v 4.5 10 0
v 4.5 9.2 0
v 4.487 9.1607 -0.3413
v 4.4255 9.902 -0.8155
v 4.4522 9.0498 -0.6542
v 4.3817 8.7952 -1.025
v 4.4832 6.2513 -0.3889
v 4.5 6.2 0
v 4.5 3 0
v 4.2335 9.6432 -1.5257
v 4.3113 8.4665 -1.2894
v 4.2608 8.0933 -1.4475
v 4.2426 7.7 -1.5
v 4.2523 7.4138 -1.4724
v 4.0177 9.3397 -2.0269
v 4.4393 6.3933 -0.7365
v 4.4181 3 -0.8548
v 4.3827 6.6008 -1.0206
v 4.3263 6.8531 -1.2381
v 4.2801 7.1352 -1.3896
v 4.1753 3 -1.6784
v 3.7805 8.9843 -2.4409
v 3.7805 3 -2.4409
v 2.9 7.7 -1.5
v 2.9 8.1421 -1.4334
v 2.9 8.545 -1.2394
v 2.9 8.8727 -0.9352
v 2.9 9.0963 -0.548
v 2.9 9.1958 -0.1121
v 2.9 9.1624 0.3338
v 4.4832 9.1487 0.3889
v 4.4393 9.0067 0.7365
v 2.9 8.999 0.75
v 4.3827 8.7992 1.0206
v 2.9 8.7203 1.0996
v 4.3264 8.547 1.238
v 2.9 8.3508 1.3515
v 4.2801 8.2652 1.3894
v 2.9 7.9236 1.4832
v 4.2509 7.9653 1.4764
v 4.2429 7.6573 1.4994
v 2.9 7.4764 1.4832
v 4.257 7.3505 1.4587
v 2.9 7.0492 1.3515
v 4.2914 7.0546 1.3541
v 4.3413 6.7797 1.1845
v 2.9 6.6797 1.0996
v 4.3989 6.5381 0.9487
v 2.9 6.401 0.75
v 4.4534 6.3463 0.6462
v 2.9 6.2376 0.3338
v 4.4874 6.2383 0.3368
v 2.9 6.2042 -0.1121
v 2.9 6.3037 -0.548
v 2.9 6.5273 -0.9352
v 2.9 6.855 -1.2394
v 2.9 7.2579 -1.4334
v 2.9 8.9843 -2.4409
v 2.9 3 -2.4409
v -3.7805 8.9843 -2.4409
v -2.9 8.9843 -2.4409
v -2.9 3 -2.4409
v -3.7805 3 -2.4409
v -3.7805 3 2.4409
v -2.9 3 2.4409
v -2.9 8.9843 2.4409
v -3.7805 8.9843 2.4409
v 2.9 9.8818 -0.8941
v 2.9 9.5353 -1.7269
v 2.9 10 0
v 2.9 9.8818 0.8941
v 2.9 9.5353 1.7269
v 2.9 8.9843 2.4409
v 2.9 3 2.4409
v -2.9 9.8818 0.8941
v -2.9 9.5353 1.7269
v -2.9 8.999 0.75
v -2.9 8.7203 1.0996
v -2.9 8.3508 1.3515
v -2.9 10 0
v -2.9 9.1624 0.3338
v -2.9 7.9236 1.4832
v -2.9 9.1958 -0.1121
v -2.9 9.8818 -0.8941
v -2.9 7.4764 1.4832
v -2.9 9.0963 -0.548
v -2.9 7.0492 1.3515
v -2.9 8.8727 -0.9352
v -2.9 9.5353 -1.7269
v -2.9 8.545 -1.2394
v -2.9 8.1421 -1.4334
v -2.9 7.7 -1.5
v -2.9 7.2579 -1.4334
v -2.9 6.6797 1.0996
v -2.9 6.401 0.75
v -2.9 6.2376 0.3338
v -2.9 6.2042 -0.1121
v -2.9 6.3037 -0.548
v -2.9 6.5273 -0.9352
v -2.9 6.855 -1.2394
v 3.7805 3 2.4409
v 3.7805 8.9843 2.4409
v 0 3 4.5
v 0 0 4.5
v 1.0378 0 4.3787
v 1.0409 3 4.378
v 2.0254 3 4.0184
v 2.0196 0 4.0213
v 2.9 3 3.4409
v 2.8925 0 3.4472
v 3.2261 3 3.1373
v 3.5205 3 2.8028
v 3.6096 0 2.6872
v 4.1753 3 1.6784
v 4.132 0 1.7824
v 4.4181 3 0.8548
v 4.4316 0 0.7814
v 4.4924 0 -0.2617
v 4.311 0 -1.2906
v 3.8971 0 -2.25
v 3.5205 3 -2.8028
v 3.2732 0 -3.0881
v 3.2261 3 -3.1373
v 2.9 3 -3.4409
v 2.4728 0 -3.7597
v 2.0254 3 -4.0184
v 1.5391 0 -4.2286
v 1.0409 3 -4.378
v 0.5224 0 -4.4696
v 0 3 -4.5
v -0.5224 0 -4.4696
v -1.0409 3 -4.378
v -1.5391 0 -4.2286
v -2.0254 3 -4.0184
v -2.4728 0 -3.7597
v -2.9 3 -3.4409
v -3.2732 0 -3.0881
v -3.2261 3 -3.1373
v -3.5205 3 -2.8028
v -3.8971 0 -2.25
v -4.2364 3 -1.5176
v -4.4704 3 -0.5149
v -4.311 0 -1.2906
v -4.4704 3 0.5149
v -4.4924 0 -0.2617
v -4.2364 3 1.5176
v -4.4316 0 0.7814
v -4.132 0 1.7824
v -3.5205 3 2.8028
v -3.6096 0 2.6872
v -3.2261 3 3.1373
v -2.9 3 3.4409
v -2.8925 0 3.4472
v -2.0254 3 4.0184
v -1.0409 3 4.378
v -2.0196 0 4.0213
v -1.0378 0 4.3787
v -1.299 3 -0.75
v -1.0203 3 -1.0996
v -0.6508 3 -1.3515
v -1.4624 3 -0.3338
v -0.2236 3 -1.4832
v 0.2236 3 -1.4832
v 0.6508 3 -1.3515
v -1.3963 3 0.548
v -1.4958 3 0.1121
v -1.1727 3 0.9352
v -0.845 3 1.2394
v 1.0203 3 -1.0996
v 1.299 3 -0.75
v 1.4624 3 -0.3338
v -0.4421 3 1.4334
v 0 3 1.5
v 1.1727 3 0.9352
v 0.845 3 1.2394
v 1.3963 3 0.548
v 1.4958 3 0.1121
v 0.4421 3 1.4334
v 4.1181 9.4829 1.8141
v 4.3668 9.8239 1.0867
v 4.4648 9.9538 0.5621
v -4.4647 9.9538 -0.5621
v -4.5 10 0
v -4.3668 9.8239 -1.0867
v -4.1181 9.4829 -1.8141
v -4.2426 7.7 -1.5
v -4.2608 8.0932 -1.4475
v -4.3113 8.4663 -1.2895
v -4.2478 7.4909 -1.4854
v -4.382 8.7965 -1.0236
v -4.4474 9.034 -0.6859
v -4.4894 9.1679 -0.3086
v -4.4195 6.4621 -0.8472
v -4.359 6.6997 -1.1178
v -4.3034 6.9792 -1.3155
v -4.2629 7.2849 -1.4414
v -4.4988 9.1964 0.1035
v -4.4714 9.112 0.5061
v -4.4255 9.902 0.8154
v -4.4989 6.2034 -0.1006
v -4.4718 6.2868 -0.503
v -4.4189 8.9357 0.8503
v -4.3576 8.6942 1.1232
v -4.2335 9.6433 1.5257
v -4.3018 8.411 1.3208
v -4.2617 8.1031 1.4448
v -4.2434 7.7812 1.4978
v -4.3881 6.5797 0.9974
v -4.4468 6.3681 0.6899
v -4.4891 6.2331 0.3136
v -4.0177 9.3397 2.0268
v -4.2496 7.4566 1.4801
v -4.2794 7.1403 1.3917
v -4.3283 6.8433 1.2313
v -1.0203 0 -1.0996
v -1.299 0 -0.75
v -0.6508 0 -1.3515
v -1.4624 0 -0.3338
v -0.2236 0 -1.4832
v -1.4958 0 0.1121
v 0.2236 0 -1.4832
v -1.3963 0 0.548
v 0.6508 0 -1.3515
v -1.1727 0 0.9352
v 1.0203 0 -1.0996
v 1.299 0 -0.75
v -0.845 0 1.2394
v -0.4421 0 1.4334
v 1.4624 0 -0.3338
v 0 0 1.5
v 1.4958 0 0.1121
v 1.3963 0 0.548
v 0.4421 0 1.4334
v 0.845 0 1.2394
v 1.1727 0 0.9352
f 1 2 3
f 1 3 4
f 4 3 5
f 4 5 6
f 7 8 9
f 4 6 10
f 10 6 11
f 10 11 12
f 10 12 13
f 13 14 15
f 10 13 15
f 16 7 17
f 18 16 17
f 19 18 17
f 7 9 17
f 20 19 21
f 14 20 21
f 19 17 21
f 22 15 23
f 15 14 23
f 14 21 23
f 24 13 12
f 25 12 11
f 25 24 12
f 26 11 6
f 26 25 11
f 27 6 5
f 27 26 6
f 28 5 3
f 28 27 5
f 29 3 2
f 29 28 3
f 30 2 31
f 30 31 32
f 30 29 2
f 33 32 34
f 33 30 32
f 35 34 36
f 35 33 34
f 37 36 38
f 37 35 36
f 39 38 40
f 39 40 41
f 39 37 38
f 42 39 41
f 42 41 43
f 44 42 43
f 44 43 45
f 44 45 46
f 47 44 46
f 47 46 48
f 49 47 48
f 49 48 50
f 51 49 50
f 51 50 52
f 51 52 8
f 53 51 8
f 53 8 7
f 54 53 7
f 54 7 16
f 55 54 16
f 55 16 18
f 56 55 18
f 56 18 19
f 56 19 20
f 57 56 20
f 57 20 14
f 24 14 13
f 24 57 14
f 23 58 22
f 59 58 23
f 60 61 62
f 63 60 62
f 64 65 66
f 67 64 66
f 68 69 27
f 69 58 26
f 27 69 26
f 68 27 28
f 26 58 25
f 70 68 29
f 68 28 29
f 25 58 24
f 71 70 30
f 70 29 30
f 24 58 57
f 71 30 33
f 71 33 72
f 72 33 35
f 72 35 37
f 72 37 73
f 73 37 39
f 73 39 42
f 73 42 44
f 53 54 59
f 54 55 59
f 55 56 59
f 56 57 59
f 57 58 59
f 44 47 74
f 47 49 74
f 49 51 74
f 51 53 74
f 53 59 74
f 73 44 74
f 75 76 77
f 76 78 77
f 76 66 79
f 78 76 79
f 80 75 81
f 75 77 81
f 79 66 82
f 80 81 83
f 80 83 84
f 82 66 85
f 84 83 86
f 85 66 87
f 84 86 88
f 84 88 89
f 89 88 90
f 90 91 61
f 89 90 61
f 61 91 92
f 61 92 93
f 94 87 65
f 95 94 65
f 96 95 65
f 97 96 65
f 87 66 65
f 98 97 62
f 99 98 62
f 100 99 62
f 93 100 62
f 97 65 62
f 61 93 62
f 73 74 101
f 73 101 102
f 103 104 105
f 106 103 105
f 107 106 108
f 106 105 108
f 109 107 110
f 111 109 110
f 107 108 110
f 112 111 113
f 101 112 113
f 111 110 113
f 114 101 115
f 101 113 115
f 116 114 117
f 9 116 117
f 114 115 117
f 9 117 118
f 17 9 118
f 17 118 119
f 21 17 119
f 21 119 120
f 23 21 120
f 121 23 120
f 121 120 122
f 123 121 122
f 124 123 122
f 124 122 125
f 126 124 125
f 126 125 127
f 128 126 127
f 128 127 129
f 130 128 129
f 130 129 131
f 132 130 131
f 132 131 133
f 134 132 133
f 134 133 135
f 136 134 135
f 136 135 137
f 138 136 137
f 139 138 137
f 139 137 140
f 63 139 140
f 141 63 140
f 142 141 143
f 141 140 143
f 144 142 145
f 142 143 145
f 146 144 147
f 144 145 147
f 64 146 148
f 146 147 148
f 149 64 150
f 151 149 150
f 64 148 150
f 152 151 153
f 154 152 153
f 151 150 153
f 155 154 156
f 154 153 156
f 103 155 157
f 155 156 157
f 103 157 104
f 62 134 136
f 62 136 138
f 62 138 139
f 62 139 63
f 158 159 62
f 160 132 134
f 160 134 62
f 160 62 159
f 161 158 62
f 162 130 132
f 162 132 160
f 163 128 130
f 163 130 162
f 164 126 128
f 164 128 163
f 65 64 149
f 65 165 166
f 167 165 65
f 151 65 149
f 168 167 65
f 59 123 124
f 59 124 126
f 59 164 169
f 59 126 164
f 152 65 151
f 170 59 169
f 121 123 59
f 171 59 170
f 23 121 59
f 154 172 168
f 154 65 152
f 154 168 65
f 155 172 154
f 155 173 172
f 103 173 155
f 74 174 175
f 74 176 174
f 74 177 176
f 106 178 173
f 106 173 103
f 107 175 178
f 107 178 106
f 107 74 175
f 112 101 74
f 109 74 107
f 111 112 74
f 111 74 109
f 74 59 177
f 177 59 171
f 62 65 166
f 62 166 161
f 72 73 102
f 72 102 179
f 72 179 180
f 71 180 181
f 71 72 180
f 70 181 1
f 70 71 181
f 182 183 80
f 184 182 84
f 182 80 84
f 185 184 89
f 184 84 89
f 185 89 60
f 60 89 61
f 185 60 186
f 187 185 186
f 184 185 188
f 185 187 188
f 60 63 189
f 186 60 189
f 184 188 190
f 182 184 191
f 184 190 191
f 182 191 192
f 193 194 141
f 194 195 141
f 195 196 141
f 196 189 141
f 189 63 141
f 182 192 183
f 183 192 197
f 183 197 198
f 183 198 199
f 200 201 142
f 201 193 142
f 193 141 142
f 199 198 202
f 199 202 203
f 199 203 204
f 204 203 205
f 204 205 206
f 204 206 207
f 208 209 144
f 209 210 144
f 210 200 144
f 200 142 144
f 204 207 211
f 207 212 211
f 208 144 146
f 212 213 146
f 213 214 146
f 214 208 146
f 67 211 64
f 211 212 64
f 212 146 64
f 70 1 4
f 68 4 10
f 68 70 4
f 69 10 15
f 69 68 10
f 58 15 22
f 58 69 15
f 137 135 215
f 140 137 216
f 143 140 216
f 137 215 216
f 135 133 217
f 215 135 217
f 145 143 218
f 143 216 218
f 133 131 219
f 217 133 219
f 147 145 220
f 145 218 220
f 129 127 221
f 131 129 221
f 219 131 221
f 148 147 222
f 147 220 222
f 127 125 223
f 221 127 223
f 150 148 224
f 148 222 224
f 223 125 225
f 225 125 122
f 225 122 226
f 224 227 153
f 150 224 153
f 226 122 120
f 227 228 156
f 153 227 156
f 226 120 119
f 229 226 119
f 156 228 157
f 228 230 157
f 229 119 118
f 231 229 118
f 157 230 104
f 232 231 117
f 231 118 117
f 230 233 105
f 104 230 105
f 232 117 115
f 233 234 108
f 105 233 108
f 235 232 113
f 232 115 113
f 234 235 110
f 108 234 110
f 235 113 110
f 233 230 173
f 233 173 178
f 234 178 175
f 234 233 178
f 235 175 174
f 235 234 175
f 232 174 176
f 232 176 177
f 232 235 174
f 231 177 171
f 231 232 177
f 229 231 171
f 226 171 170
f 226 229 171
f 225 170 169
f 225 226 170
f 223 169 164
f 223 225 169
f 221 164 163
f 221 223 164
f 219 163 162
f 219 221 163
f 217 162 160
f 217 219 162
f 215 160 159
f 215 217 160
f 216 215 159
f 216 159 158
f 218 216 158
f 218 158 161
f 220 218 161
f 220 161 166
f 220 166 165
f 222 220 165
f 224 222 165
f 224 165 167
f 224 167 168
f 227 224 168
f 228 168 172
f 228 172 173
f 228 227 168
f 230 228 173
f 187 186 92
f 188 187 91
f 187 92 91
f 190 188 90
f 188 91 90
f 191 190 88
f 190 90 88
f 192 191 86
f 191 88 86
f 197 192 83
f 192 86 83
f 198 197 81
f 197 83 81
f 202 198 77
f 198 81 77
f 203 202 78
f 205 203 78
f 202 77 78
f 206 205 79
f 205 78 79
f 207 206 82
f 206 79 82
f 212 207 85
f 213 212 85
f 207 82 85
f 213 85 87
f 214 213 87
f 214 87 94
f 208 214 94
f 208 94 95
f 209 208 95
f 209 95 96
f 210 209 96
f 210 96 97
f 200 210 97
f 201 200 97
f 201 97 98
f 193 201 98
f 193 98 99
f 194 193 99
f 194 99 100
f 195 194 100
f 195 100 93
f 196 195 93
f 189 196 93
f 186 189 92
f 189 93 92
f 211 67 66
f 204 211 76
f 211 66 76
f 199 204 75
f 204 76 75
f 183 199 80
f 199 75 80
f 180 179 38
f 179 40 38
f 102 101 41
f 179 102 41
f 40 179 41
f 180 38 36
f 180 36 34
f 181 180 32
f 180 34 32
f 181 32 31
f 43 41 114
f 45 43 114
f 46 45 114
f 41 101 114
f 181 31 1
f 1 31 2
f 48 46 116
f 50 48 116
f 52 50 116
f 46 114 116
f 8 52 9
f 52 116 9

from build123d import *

# Parameters (mm, degrees)
SKETCH1_R           = 4.5
SKETCH1_R_2         = 1.5
BOSS_EXTRUDE1_DEPTH = 3
BOSS_EXTRUDE2_DEPTH = 7
SKETCH3_R           = 1.5
CUT_EXTRUDE1_DEPTH  = 6.5


with BuildPart() as part:
    # Sketch1 → Boss-Extrude1 (new body)
    with BuildSketch(Plane(origin=(0, 0, 0), x_dir=(1, 0, 0), z_dir=(0, 1, 0))):
        with Locations(Location((0, 0, 0), (0, 0, 270))):
            Circle(SKETCH1_R)
        with Locations(Location((0, 0, 0), (0, 0, 270))):
            Circle(SKETCH1_R_2, mode=Mode.SUBTRACT)
    extrude(amount=BOSS_EXTRUDE1_DEPTH)

    # Sketch2 → Boss-Extrude2 (add)
    with BuildSketch(Plane(origin=(0, 3, 0), x_dir=(1, 0, 0), z_dir=(0, 1, 0))):
        with BuildLine():
            ThreePointArc((-2.9, 3.440930107), (-4.5, 0), (-2.9, -3.440930107))
            Line((-2.9, -3.440930107), (-2.9, 3.440930107))
        make_face()
        with BuildLine():
            Line((2.9, 3.440930107), (2.9, -3.440930107))
            ThreePointArc((2.9, -3.440930107), (4.080441153, -1.897366596), (4.5, 0))
            ThreePointArc((4.5, 0), (4.080441153, 1.897366596), (2.9, 3.440930107))
        make_face()
    extrude(amount=BOSS_EXTRUDE2_DEPTH)

    # Sketch3 → Cut-Extrude1 (cut)
    with BuildSketch(Plane(origin=(-2.9, 0, 0), x_dir=(0, 0, -1), z_dir=(1, 0, 0))):
        with BuildLine():
            Line((2.440930107, 8.984324563), (2.440930107, 3))
            Line((2.440930107, 3), (3.440930107, 3))
            Line((3.440930107, 3), (3.440930107, 10))
            Line((3.440930107, 10), (0, 10))
            ThreePointArc((0, 10), (1.321905479, 9.735949794), (2.440930107, 8.984324563))
        make_face()
        with BuildLine():
            ThreePointArc((-2.440930107, 8.984324563), (-1.321905479, 9.735949794), (0, 10))
            Line((0, 10), (-3.440930107, 10))
            Line((-3.440930107, 10), (-3.440930107, 3))
            Line((-3.440930107, 3), (-2.440930107, 3))
            Line((-2.440930107, 3), (-2.440930107, 8.984324563))
        make_face()
        with Locations((0, 7.7)):
            Circle(SKETCH3_R)
    cut_extrude1 = extrude(amount=-CUT_EXTRUDE1_DEPTH, mode=Mode.SUBTRACT)

    # Mirror1: Cut-Extrude1 across plane
    add(cut_extrude1.mirror(Plane(origin=(0, 0, 0), x_dir=(0, 0, 1), z_dir=(1, 0, 0))), mode=Mode.SUBTRACT)


solid = part.part
